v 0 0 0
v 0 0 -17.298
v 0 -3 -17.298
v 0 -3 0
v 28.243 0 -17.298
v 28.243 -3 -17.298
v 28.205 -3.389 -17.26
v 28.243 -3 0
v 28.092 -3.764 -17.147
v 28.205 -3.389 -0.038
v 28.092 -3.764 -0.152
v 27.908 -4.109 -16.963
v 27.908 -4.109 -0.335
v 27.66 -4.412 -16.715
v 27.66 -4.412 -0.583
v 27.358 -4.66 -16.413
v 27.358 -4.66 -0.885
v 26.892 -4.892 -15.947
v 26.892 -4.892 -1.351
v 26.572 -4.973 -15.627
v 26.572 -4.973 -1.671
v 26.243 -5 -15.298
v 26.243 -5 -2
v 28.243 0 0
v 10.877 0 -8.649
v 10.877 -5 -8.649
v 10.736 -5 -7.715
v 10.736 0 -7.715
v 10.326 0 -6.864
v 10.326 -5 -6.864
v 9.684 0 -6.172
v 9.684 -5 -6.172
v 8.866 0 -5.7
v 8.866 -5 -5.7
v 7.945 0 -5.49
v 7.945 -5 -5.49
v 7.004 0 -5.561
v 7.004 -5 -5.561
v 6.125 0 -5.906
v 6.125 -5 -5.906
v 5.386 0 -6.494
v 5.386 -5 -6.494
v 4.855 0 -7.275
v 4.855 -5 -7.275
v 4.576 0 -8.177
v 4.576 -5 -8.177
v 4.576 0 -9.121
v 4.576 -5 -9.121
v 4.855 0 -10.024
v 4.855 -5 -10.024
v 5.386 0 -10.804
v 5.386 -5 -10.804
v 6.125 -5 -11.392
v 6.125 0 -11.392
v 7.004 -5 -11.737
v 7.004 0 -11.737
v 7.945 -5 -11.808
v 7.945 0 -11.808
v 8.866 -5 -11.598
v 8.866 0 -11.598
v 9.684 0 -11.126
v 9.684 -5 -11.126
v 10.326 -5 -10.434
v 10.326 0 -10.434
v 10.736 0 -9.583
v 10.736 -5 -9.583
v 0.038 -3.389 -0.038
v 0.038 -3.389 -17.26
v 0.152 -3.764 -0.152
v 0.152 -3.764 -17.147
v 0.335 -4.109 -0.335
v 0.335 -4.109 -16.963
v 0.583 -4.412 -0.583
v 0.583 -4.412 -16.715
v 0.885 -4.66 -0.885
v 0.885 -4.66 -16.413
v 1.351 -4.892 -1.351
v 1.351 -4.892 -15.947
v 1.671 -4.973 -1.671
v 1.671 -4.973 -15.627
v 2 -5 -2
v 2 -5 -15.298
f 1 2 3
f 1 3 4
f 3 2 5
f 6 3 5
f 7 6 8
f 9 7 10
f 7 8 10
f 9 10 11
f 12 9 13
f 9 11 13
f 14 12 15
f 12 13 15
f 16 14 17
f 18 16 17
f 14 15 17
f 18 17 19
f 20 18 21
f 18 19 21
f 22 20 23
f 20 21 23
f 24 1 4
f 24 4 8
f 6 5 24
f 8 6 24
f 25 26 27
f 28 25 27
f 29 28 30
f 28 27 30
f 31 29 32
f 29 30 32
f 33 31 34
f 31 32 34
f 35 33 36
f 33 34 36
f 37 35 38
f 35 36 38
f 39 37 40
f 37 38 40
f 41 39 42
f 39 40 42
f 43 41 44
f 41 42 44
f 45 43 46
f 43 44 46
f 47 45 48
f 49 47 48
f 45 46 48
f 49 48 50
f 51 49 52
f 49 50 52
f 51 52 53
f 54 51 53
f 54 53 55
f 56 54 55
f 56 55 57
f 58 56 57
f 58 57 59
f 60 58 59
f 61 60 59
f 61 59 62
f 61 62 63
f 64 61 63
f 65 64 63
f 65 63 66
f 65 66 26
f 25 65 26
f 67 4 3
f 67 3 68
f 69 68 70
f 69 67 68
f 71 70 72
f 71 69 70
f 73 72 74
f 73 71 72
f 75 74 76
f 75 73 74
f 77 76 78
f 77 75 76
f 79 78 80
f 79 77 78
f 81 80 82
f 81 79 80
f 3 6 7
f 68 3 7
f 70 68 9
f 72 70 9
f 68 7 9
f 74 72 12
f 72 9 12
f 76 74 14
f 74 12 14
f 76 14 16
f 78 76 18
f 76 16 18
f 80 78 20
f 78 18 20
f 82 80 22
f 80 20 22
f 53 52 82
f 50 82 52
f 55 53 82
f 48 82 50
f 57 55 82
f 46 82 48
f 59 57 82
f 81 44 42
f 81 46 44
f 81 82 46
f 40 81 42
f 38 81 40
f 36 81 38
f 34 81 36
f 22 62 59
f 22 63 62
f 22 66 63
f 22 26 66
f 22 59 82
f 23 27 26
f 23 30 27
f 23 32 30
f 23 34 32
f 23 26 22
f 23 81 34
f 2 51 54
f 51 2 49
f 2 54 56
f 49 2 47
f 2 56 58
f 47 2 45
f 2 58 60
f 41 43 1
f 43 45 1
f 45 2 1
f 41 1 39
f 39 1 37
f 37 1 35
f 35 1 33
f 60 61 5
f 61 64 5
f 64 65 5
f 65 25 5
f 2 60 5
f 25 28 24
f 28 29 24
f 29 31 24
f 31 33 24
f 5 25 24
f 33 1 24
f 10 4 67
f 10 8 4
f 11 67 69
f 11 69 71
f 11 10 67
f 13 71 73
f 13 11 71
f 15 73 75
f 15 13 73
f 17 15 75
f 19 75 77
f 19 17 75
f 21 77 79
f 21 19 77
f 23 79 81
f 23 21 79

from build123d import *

# Parameters (mm, degrees)
F0_W     = 28.243152
F0_H     = 17.298024
F1_DEPTH = 5
F2_R     = 2
F3_R     = 3.167905
F4_DEPTH = 25


with BuildPart() as f1:
    # F0 (on Front) → F1 (new body)
    with BuildSketch(Plane.XZ):
        with Locations((14.121576, -8.649012)):
            Rectangle(F0_W, F0_H)
    extrude(amount=F1_DEPTH)

    # F2
    f2_edges = [f1.edges().sort_by_distance(p)[0] for p in [
        (14.121576, -5, -17.298024),
        (28.243152, -5, -8.649012),
        (14.121576, -5, 0),
        (0, -5, -8.649012),
    ]]
    fillet(f2_edges, radius=F2_R)

    # F3 (on face) → F4 (cut)
    with BuildSketch(Plane.XZ.offset(5)):
        with Locations((7.708723, -8.649012)):
            Circle(F3_R)
    extrude(amount=-F4_DEPTH, mode=Mode.SUBTRACT)


solid = f1.part
